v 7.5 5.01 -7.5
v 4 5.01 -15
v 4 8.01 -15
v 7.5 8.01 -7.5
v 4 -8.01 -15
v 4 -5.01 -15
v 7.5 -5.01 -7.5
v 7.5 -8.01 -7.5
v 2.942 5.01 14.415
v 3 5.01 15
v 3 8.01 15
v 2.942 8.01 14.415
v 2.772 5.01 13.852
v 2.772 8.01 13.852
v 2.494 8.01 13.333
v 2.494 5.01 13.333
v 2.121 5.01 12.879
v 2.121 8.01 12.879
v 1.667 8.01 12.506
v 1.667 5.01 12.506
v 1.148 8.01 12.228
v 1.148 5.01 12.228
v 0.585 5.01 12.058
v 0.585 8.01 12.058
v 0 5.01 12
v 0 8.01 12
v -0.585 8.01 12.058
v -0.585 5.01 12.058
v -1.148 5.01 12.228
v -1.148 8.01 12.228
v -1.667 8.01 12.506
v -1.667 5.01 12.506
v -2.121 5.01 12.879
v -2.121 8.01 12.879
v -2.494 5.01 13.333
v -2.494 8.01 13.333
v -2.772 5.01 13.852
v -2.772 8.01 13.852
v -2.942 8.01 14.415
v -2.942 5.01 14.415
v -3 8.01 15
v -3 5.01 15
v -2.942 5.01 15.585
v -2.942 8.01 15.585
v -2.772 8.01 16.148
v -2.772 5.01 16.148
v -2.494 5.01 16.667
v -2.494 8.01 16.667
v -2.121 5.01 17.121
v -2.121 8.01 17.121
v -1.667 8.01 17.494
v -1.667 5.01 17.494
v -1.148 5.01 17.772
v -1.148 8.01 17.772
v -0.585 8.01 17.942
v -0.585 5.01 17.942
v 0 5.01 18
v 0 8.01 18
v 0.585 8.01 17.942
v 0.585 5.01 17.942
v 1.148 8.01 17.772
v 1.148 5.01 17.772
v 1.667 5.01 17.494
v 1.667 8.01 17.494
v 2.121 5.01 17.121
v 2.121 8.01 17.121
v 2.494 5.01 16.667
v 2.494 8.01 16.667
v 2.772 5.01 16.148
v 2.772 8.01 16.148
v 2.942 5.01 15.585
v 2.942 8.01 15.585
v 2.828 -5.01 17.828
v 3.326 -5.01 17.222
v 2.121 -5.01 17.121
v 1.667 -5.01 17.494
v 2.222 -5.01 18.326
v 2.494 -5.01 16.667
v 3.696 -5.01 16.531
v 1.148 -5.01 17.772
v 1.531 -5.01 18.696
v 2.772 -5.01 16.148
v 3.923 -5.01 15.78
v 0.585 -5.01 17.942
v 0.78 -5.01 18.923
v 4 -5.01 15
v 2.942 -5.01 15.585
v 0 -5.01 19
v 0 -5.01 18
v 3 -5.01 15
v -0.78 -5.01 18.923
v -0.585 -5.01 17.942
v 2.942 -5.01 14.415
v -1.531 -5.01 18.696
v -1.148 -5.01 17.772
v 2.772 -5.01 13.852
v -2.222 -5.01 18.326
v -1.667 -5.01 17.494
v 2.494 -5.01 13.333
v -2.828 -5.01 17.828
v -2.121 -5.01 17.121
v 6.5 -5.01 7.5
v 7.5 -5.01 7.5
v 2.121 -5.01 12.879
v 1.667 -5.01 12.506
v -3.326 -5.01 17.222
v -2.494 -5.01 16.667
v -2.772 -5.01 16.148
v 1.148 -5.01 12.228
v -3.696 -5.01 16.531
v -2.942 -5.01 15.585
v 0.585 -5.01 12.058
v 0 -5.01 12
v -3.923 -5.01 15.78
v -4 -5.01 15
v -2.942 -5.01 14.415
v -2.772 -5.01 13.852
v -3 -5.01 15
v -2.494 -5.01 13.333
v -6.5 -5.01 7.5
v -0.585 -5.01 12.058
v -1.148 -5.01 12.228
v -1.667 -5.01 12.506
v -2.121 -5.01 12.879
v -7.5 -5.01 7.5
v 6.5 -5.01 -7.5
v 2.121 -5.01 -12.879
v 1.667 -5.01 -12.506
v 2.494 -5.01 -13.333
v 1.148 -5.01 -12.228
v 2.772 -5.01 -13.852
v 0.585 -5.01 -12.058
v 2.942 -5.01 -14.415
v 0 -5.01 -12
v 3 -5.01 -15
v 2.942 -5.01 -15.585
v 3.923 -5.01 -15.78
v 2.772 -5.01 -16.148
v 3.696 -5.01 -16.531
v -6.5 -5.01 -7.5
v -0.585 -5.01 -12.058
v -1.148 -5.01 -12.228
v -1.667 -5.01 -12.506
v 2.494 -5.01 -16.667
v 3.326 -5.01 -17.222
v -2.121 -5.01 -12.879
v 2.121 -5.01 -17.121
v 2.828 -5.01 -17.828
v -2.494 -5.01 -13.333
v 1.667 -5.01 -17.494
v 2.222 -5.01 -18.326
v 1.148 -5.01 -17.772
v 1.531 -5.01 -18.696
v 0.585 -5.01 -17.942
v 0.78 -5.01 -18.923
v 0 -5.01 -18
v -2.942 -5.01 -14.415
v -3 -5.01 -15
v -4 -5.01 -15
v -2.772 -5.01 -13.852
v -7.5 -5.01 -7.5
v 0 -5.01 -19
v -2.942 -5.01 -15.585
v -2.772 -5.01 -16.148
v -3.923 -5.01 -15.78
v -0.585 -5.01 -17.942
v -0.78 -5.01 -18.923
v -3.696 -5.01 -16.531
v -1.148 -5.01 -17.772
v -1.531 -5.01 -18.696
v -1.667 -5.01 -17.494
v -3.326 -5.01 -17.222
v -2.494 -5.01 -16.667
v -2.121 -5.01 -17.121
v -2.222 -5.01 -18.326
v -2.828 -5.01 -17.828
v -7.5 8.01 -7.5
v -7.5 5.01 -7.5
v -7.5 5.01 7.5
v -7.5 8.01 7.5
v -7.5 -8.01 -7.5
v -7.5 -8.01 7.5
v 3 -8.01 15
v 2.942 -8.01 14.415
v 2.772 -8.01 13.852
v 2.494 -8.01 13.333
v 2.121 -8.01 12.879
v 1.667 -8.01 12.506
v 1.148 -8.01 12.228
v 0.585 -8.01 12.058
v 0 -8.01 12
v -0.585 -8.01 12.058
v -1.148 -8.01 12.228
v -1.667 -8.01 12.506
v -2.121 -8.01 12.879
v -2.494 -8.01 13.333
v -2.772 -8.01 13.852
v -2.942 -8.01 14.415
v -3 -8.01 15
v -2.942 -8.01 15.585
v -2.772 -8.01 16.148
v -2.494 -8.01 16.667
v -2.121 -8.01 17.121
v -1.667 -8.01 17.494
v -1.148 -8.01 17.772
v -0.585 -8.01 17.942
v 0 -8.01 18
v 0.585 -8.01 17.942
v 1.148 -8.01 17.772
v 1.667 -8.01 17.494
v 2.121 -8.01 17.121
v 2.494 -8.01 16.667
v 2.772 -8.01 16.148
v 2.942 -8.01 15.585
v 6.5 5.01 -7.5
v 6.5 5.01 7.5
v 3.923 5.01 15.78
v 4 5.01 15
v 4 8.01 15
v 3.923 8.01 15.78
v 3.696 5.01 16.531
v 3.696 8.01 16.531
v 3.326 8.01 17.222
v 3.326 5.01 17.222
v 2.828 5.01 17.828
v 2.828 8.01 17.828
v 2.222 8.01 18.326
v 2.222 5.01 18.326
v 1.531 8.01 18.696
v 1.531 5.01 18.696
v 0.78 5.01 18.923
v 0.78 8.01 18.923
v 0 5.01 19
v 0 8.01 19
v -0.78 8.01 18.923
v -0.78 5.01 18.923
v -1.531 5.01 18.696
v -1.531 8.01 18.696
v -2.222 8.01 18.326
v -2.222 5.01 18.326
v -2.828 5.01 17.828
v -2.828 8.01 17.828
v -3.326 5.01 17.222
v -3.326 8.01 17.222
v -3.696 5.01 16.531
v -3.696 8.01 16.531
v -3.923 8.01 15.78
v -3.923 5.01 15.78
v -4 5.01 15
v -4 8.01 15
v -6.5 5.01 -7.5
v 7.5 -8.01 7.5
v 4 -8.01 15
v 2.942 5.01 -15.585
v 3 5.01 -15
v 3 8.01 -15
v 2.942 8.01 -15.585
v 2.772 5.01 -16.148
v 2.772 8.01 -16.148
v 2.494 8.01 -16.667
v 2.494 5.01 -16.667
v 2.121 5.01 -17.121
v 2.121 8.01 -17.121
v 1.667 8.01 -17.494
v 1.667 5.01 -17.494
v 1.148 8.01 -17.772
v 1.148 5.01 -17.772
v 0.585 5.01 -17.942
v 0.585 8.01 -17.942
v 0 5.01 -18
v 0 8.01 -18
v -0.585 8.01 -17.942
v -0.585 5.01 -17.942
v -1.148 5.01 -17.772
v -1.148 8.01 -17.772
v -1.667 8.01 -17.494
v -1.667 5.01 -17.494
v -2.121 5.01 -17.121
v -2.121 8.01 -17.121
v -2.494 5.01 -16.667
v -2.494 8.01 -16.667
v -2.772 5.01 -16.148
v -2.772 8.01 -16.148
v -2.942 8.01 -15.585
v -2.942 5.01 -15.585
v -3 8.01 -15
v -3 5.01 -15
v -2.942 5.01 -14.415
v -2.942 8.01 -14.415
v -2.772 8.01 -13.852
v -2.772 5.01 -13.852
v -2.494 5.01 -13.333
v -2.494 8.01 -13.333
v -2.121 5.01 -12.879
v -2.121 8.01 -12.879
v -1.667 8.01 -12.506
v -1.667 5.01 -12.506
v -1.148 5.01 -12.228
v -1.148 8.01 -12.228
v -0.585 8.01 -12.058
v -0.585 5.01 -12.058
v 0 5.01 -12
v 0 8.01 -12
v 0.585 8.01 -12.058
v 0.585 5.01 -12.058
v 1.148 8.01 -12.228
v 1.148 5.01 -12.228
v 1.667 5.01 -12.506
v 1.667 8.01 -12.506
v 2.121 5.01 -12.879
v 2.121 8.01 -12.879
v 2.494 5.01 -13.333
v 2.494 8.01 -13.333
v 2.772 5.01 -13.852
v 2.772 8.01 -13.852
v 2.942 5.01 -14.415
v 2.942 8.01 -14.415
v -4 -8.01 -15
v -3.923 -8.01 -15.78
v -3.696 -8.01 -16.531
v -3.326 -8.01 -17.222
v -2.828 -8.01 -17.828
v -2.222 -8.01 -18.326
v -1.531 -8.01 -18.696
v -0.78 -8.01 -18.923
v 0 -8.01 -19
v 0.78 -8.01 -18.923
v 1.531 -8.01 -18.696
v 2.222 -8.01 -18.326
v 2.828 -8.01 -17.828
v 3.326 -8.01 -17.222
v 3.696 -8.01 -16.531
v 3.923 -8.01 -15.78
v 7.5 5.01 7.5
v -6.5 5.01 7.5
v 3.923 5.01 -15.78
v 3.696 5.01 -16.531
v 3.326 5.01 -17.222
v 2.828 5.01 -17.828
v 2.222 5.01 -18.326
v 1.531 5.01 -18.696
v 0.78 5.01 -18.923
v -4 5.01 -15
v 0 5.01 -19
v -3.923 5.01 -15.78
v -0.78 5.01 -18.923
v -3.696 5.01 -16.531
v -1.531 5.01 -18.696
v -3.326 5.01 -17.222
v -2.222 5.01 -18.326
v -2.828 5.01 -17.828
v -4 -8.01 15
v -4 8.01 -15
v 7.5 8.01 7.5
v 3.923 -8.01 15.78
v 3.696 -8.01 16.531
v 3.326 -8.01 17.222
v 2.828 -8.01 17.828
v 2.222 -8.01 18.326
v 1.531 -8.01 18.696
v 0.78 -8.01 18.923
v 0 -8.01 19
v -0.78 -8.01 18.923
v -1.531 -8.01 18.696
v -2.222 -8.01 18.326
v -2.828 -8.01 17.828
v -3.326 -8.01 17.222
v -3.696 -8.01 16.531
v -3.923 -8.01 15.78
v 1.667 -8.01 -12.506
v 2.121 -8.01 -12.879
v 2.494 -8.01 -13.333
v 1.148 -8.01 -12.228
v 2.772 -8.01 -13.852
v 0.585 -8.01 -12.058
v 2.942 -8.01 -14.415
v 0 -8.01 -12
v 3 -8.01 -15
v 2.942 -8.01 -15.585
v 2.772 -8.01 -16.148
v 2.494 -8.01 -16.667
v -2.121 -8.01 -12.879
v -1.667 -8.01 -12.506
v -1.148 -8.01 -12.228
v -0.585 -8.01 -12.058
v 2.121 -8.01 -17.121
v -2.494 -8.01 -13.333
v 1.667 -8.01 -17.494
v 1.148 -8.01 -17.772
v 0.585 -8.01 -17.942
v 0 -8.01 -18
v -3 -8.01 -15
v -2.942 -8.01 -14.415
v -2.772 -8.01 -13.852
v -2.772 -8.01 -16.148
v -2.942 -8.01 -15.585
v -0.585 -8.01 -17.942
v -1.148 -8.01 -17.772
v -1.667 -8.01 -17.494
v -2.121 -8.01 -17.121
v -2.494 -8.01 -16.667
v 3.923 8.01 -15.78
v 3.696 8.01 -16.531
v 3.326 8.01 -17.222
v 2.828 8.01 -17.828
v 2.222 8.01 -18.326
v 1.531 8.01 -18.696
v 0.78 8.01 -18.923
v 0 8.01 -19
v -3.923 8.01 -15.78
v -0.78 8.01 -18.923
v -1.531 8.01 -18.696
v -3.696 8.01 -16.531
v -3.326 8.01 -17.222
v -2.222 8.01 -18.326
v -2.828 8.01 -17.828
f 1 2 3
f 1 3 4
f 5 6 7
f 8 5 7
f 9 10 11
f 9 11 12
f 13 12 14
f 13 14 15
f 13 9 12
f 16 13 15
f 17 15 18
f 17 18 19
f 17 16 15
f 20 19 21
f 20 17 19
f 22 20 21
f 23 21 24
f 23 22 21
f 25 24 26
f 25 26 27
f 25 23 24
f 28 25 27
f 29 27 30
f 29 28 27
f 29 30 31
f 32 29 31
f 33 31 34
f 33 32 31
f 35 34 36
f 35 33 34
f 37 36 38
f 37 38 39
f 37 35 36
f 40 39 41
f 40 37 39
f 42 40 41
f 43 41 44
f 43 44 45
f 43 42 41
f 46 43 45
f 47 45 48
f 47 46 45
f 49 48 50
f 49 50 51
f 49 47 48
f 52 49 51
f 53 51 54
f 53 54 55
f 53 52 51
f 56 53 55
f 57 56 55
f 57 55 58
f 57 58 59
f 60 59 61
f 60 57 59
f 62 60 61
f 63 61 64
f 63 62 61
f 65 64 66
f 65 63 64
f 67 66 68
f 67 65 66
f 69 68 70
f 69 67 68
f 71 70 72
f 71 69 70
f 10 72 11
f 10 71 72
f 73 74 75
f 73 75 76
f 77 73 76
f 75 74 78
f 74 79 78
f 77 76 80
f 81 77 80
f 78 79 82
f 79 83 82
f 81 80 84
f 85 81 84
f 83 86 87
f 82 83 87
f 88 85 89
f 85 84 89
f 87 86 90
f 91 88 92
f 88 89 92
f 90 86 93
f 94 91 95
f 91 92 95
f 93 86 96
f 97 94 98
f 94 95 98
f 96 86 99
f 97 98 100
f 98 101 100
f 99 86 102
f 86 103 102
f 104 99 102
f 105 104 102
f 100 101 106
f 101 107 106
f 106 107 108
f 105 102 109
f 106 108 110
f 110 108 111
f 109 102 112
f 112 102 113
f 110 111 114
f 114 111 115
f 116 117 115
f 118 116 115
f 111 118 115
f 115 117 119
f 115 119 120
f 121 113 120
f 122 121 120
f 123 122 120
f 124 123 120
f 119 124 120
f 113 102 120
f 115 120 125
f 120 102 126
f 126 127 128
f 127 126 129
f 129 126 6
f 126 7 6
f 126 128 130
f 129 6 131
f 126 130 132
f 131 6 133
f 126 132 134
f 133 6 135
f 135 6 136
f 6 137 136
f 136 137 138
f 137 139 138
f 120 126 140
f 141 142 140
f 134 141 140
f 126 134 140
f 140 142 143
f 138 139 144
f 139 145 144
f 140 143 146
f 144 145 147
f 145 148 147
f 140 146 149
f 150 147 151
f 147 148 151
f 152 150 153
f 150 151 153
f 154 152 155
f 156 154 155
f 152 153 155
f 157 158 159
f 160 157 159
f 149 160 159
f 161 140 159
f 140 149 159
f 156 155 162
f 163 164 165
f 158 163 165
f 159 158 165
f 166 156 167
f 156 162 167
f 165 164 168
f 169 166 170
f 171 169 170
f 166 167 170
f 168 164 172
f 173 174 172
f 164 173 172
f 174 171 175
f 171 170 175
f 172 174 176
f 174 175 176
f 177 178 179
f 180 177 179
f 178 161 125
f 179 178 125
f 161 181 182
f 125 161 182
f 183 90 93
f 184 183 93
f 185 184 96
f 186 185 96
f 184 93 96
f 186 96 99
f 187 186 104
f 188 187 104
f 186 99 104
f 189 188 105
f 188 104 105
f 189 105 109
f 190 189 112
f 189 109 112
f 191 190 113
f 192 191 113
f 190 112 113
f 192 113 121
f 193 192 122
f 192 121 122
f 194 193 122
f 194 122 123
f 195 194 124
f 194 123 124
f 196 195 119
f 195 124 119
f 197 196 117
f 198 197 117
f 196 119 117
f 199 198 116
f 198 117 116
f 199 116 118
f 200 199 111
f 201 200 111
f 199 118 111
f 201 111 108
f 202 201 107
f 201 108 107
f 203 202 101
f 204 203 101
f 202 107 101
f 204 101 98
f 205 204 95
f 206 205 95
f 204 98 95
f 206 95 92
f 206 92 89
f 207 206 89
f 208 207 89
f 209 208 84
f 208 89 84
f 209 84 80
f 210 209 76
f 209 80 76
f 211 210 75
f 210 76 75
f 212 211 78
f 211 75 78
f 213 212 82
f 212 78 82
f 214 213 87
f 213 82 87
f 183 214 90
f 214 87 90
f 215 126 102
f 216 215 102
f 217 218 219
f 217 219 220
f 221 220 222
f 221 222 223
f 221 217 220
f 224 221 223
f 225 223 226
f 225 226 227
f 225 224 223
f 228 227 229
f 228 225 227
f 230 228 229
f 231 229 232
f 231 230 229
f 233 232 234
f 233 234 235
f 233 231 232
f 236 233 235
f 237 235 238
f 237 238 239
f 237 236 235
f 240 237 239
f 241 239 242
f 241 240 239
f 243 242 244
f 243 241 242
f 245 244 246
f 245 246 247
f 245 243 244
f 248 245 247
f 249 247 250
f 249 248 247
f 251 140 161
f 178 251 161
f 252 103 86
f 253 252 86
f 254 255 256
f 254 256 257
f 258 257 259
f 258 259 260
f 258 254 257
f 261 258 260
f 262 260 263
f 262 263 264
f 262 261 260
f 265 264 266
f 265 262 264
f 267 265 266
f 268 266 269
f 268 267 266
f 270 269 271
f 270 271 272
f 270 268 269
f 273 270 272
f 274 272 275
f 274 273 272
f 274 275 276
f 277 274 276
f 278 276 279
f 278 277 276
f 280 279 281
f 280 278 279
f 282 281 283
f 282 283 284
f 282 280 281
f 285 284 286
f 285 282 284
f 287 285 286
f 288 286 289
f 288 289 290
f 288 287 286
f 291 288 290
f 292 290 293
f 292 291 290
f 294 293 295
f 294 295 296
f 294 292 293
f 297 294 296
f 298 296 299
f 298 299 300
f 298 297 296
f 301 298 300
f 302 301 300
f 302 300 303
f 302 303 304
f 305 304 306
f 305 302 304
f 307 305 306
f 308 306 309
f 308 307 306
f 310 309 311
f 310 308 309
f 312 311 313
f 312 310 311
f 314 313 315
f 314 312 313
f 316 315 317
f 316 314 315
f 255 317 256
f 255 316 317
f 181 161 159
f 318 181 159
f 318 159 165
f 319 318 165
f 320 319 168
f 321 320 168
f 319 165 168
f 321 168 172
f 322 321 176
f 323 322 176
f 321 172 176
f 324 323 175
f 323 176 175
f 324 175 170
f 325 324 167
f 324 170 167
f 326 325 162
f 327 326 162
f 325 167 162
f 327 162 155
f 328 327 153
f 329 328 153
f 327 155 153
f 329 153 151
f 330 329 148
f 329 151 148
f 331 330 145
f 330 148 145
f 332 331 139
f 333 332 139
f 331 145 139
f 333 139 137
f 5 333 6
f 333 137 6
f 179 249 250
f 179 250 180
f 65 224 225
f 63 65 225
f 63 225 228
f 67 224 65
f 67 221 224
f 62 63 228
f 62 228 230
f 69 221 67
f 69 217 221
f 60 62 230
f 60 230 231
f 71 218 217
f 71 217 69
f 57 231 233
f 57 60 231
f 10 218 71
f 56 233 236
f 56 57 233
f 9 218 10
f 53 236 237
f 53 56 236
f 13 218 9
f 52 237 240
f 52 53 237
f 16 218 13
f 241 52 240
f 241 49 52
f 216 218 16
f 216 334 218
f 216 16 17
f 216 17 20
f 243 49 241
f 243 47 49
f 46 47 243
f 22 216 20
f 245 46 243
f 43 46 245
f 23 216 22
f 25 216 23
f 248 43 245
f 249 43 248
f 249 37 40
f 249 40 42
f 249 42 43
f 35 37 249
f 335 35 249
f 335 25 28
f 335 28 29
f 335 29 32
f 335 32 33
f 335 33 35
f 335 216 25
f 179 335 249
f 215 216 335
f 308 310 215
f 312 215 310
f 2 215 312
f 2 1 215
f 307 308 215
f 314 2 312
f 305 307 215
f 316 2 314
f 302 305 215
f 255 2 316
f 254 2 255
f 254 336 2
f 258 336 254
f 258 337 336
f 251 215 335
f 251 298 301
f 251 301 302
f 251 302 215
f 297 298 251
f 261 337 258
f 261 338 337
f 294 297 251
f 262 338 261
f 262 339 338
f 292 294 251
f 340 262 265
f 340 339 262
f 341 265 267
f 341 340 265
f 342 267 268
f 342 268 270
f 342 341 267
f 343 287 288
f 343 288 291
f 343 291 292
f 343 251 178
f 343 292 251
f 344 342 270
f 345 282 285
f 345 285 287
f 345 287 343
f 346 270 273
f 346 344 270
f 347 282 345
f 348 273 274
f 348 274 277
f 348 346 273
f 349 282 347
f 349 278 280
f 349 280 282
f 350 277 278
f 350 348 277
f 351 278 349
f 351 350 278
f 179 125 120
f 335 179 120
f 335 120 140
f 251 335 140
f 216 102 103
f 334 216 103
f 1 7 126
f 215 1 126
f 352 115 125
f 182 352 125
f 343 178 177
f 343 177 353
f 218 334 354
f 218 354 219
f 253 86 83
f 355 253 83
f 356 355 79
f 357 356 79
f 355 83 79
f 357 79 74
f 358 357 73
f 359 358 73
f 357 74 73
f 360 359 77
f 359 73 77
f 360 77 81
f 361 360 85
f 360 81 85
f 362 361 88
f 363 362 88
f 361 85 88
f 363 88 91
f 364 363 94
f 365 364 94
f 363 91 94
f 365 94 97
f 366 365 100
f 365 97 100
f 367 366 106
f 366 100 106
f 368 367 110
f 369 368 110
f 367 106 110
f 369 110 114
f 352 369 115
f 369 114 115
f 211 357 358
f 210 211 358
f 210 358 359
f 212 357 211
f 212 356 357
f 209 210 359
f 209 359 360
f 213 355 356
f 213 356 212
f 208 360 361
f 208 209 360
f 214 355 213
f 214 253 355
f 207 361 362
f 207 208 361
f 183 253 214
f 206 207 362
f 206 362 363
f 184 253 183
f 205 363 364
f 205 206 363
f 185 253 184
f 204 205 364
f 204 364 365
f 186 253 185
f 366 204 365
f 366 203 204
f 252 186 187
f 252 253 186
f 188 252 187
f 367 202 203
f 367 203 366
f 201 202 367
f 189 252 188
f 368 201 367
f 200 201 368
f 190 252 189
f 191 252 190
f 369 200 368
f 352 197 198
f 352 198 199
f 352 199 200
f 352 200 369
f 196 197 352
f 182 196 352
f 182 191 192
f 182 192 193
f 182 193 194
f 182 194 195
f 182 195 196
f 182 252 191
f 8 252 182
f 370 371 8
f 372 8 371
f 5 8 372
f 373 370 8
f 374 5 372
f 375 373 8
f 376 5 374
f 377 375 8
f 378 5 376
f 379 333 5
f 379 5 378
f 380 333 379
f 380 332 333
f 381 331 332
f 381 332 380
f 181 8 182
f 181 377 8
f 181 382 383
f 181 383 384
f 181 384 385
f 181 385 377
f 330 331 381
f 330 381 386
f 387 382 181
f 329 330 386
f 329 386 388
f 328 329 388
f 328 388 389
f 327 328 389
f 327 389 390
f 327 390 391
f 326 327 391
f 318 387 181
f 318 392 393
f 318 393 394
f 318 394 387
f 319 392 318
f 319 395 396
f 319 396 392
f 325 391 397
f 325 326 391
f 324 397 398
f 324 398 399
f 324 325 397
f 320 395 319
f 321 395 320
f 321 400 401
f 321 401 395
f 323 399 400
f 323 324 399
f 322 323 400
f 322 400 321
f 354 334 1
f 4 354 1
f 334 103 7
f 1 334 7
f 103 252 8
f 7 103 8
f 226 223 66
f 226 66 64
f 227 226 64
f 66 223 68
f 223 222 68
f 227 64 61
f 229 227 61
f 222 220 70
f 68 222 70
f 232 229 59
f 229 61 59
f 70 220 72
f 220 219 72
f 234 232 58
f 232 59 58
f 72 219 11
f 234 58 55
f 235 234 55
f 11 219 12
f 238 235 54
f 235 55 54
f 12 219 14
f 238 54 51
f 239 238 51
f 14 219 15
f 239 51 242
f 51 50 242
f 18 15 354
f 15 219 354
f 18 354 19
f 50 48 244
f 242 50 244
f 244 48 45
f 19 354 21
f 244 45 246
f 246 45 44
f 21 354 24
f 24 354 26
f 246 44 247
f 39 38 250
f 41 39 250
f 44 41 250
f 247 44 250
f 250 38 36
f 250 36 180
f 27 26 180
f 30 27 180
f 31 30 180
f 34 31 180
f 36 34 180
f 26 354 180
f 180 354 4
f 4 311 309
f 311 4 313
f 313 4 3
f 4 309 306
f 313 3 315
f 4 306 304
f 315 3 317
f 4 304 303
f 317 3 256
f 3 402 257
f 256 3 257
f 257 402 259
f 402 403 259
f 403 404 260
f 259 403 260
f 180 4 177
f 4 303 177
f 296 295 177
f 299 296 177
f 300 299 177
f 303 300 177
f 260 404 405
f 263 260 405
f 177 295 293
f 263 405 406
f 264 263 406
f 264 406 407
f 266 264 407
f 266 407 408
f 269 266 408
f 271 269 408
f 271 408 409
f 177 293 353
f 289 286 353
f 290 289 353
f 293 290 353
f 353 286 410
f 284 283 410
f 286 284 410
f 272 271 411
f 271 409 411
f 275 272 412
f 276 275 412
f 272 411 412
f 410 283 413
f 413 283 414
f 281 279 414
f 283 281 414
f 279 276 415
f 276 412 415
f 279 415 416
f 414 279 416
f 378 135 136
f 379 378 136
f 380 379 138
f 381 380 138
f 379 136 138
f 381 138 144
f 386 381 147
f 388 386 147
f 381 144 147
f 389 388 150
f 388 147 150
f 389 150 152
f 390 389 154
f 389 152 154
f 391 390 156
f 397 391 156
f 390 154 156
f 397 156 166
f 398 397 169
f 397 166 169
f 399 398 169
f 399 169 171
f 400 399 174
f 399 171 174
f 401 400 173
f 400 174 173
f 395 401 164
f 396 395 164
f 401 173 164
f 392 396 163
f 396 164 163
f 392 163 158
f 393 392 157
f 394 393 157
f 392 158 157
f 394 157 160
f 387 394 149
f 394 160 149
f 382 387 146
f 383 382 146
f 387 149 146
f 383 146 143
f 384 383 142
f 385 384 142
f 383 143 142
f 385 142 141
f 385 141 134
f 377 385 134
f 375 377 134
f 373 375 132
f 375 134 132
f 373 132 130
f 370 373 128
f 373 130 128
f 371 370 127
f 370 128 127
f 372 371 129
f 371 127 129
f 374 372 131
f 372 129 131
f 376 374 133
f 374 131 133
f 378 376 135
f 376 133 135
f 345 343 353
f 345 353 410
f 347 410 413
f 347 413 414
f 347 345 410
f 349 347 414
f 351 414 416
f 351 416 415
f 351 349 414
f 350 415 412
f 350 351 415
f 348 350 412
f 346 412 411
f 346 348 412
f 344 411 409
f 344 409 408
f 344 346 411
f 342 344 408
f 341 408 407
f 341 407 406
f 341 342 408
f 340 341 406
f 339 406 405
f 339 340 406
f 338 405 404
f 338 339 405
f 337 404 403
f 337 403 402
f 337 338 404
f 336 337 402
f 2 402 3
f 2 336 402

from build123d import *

# Parameters (mm, degrees)
SKETCH1_R           = 3
BOSS_EXTRUDE1_DEPTH = 3
SKETCH5_W           = 1
SKETCH5_H           = 15
SKETCH4_W           = 1
SKETCH4_H           = 15
SKETCH7_W           = 1
SKETCH7_H           = 15
SKETCH6_W           = 1
SKETCH6_H           = 15


with BuildPart() as part:
    # Sketch1 → Boss-Extrude1 (new body)
    with BuildSketch(Plane(origin=(0, 5.01, 0), x_dir=(1, 0, 0), z_dir=(0, 1, 0))):
        with BuildLine():
            Line((-7.5, -7.5), (-7.5, 7.5))
            Line((-7.5, 7.5), (-4, 15))
            ThreePointArc((-4, 15), (0, 19), (4, 15))
            Line((4, 15), (7.5, 7.5))
            Line((7.5, 7.5), (7.5, -7.5))
            Line((7.5, -7.5), (4, -15))
            ThreePointArc((4, -15), (0, -19), (-4, -15))
            Line((-4, -15), (-7.5, -7.5))
        make_face()
        with Locations((0, 15)):
            Circle(SKETCH1_R, mode=Mode.SUBTRACT)
        with Locations((0, -15)):
            Circle(SKETCH1_R, mode=Mode.SUBTRACT)
    boss_extrude1 = extrude(amount=BOSS_EXTRUDE1_DEPTH)

    # Sketch5 → Loft2 section 0
    with BuildSketch(Plane(origin=(0, 0, 0), x_dir=(1, 0, 0), z_dir=(0, 1, 0))):
        with Locations((7, 0)):
            Rectangle(SKETCH5_W, SKETCH5_H)
    # Sketch4 → Loft2 section 1
    with BuildSketch(Plane(origin=(0, 5.01, 0), x_dir=(1, 0, 0), z_dir=(0, 1, 0))):
        with Locations((7, 0)):
            Rectangle(SKETCH4_W, SKETCH4_H)
    loft2 = loft()

    # Sketch7 → Loft3 section 0
    with BuildSketch(Plane(origin=(0, 0, 0), x_dir=(1, 0, 0), z_dir=(0, 1, 0))):
        with Locations((-7, 0)):
            Rectangle(SKETCH7_W, SKETCH7_H)
    # Sketch6 → Loft3 section 1
    with BuildSketch(Plane(origin=(0, 5.01, 0), x_dir=(1, 0, 0), z_dir=(0, 1, 0))):
        with Locations((-7, 0)):
            Rectangle(SKETCH6_W, SKETCH6_H)
    loft3 = loft()

    # Mirror2: Boss-Extrude1, Loft2, Loft3 across plane
    add(boss_extrude1.mirror(Plane.ZX))
    add(loft2.mirror(Plane.ZX))
    add(loft3.mirror(Plane.ZX))


solid = part.part
